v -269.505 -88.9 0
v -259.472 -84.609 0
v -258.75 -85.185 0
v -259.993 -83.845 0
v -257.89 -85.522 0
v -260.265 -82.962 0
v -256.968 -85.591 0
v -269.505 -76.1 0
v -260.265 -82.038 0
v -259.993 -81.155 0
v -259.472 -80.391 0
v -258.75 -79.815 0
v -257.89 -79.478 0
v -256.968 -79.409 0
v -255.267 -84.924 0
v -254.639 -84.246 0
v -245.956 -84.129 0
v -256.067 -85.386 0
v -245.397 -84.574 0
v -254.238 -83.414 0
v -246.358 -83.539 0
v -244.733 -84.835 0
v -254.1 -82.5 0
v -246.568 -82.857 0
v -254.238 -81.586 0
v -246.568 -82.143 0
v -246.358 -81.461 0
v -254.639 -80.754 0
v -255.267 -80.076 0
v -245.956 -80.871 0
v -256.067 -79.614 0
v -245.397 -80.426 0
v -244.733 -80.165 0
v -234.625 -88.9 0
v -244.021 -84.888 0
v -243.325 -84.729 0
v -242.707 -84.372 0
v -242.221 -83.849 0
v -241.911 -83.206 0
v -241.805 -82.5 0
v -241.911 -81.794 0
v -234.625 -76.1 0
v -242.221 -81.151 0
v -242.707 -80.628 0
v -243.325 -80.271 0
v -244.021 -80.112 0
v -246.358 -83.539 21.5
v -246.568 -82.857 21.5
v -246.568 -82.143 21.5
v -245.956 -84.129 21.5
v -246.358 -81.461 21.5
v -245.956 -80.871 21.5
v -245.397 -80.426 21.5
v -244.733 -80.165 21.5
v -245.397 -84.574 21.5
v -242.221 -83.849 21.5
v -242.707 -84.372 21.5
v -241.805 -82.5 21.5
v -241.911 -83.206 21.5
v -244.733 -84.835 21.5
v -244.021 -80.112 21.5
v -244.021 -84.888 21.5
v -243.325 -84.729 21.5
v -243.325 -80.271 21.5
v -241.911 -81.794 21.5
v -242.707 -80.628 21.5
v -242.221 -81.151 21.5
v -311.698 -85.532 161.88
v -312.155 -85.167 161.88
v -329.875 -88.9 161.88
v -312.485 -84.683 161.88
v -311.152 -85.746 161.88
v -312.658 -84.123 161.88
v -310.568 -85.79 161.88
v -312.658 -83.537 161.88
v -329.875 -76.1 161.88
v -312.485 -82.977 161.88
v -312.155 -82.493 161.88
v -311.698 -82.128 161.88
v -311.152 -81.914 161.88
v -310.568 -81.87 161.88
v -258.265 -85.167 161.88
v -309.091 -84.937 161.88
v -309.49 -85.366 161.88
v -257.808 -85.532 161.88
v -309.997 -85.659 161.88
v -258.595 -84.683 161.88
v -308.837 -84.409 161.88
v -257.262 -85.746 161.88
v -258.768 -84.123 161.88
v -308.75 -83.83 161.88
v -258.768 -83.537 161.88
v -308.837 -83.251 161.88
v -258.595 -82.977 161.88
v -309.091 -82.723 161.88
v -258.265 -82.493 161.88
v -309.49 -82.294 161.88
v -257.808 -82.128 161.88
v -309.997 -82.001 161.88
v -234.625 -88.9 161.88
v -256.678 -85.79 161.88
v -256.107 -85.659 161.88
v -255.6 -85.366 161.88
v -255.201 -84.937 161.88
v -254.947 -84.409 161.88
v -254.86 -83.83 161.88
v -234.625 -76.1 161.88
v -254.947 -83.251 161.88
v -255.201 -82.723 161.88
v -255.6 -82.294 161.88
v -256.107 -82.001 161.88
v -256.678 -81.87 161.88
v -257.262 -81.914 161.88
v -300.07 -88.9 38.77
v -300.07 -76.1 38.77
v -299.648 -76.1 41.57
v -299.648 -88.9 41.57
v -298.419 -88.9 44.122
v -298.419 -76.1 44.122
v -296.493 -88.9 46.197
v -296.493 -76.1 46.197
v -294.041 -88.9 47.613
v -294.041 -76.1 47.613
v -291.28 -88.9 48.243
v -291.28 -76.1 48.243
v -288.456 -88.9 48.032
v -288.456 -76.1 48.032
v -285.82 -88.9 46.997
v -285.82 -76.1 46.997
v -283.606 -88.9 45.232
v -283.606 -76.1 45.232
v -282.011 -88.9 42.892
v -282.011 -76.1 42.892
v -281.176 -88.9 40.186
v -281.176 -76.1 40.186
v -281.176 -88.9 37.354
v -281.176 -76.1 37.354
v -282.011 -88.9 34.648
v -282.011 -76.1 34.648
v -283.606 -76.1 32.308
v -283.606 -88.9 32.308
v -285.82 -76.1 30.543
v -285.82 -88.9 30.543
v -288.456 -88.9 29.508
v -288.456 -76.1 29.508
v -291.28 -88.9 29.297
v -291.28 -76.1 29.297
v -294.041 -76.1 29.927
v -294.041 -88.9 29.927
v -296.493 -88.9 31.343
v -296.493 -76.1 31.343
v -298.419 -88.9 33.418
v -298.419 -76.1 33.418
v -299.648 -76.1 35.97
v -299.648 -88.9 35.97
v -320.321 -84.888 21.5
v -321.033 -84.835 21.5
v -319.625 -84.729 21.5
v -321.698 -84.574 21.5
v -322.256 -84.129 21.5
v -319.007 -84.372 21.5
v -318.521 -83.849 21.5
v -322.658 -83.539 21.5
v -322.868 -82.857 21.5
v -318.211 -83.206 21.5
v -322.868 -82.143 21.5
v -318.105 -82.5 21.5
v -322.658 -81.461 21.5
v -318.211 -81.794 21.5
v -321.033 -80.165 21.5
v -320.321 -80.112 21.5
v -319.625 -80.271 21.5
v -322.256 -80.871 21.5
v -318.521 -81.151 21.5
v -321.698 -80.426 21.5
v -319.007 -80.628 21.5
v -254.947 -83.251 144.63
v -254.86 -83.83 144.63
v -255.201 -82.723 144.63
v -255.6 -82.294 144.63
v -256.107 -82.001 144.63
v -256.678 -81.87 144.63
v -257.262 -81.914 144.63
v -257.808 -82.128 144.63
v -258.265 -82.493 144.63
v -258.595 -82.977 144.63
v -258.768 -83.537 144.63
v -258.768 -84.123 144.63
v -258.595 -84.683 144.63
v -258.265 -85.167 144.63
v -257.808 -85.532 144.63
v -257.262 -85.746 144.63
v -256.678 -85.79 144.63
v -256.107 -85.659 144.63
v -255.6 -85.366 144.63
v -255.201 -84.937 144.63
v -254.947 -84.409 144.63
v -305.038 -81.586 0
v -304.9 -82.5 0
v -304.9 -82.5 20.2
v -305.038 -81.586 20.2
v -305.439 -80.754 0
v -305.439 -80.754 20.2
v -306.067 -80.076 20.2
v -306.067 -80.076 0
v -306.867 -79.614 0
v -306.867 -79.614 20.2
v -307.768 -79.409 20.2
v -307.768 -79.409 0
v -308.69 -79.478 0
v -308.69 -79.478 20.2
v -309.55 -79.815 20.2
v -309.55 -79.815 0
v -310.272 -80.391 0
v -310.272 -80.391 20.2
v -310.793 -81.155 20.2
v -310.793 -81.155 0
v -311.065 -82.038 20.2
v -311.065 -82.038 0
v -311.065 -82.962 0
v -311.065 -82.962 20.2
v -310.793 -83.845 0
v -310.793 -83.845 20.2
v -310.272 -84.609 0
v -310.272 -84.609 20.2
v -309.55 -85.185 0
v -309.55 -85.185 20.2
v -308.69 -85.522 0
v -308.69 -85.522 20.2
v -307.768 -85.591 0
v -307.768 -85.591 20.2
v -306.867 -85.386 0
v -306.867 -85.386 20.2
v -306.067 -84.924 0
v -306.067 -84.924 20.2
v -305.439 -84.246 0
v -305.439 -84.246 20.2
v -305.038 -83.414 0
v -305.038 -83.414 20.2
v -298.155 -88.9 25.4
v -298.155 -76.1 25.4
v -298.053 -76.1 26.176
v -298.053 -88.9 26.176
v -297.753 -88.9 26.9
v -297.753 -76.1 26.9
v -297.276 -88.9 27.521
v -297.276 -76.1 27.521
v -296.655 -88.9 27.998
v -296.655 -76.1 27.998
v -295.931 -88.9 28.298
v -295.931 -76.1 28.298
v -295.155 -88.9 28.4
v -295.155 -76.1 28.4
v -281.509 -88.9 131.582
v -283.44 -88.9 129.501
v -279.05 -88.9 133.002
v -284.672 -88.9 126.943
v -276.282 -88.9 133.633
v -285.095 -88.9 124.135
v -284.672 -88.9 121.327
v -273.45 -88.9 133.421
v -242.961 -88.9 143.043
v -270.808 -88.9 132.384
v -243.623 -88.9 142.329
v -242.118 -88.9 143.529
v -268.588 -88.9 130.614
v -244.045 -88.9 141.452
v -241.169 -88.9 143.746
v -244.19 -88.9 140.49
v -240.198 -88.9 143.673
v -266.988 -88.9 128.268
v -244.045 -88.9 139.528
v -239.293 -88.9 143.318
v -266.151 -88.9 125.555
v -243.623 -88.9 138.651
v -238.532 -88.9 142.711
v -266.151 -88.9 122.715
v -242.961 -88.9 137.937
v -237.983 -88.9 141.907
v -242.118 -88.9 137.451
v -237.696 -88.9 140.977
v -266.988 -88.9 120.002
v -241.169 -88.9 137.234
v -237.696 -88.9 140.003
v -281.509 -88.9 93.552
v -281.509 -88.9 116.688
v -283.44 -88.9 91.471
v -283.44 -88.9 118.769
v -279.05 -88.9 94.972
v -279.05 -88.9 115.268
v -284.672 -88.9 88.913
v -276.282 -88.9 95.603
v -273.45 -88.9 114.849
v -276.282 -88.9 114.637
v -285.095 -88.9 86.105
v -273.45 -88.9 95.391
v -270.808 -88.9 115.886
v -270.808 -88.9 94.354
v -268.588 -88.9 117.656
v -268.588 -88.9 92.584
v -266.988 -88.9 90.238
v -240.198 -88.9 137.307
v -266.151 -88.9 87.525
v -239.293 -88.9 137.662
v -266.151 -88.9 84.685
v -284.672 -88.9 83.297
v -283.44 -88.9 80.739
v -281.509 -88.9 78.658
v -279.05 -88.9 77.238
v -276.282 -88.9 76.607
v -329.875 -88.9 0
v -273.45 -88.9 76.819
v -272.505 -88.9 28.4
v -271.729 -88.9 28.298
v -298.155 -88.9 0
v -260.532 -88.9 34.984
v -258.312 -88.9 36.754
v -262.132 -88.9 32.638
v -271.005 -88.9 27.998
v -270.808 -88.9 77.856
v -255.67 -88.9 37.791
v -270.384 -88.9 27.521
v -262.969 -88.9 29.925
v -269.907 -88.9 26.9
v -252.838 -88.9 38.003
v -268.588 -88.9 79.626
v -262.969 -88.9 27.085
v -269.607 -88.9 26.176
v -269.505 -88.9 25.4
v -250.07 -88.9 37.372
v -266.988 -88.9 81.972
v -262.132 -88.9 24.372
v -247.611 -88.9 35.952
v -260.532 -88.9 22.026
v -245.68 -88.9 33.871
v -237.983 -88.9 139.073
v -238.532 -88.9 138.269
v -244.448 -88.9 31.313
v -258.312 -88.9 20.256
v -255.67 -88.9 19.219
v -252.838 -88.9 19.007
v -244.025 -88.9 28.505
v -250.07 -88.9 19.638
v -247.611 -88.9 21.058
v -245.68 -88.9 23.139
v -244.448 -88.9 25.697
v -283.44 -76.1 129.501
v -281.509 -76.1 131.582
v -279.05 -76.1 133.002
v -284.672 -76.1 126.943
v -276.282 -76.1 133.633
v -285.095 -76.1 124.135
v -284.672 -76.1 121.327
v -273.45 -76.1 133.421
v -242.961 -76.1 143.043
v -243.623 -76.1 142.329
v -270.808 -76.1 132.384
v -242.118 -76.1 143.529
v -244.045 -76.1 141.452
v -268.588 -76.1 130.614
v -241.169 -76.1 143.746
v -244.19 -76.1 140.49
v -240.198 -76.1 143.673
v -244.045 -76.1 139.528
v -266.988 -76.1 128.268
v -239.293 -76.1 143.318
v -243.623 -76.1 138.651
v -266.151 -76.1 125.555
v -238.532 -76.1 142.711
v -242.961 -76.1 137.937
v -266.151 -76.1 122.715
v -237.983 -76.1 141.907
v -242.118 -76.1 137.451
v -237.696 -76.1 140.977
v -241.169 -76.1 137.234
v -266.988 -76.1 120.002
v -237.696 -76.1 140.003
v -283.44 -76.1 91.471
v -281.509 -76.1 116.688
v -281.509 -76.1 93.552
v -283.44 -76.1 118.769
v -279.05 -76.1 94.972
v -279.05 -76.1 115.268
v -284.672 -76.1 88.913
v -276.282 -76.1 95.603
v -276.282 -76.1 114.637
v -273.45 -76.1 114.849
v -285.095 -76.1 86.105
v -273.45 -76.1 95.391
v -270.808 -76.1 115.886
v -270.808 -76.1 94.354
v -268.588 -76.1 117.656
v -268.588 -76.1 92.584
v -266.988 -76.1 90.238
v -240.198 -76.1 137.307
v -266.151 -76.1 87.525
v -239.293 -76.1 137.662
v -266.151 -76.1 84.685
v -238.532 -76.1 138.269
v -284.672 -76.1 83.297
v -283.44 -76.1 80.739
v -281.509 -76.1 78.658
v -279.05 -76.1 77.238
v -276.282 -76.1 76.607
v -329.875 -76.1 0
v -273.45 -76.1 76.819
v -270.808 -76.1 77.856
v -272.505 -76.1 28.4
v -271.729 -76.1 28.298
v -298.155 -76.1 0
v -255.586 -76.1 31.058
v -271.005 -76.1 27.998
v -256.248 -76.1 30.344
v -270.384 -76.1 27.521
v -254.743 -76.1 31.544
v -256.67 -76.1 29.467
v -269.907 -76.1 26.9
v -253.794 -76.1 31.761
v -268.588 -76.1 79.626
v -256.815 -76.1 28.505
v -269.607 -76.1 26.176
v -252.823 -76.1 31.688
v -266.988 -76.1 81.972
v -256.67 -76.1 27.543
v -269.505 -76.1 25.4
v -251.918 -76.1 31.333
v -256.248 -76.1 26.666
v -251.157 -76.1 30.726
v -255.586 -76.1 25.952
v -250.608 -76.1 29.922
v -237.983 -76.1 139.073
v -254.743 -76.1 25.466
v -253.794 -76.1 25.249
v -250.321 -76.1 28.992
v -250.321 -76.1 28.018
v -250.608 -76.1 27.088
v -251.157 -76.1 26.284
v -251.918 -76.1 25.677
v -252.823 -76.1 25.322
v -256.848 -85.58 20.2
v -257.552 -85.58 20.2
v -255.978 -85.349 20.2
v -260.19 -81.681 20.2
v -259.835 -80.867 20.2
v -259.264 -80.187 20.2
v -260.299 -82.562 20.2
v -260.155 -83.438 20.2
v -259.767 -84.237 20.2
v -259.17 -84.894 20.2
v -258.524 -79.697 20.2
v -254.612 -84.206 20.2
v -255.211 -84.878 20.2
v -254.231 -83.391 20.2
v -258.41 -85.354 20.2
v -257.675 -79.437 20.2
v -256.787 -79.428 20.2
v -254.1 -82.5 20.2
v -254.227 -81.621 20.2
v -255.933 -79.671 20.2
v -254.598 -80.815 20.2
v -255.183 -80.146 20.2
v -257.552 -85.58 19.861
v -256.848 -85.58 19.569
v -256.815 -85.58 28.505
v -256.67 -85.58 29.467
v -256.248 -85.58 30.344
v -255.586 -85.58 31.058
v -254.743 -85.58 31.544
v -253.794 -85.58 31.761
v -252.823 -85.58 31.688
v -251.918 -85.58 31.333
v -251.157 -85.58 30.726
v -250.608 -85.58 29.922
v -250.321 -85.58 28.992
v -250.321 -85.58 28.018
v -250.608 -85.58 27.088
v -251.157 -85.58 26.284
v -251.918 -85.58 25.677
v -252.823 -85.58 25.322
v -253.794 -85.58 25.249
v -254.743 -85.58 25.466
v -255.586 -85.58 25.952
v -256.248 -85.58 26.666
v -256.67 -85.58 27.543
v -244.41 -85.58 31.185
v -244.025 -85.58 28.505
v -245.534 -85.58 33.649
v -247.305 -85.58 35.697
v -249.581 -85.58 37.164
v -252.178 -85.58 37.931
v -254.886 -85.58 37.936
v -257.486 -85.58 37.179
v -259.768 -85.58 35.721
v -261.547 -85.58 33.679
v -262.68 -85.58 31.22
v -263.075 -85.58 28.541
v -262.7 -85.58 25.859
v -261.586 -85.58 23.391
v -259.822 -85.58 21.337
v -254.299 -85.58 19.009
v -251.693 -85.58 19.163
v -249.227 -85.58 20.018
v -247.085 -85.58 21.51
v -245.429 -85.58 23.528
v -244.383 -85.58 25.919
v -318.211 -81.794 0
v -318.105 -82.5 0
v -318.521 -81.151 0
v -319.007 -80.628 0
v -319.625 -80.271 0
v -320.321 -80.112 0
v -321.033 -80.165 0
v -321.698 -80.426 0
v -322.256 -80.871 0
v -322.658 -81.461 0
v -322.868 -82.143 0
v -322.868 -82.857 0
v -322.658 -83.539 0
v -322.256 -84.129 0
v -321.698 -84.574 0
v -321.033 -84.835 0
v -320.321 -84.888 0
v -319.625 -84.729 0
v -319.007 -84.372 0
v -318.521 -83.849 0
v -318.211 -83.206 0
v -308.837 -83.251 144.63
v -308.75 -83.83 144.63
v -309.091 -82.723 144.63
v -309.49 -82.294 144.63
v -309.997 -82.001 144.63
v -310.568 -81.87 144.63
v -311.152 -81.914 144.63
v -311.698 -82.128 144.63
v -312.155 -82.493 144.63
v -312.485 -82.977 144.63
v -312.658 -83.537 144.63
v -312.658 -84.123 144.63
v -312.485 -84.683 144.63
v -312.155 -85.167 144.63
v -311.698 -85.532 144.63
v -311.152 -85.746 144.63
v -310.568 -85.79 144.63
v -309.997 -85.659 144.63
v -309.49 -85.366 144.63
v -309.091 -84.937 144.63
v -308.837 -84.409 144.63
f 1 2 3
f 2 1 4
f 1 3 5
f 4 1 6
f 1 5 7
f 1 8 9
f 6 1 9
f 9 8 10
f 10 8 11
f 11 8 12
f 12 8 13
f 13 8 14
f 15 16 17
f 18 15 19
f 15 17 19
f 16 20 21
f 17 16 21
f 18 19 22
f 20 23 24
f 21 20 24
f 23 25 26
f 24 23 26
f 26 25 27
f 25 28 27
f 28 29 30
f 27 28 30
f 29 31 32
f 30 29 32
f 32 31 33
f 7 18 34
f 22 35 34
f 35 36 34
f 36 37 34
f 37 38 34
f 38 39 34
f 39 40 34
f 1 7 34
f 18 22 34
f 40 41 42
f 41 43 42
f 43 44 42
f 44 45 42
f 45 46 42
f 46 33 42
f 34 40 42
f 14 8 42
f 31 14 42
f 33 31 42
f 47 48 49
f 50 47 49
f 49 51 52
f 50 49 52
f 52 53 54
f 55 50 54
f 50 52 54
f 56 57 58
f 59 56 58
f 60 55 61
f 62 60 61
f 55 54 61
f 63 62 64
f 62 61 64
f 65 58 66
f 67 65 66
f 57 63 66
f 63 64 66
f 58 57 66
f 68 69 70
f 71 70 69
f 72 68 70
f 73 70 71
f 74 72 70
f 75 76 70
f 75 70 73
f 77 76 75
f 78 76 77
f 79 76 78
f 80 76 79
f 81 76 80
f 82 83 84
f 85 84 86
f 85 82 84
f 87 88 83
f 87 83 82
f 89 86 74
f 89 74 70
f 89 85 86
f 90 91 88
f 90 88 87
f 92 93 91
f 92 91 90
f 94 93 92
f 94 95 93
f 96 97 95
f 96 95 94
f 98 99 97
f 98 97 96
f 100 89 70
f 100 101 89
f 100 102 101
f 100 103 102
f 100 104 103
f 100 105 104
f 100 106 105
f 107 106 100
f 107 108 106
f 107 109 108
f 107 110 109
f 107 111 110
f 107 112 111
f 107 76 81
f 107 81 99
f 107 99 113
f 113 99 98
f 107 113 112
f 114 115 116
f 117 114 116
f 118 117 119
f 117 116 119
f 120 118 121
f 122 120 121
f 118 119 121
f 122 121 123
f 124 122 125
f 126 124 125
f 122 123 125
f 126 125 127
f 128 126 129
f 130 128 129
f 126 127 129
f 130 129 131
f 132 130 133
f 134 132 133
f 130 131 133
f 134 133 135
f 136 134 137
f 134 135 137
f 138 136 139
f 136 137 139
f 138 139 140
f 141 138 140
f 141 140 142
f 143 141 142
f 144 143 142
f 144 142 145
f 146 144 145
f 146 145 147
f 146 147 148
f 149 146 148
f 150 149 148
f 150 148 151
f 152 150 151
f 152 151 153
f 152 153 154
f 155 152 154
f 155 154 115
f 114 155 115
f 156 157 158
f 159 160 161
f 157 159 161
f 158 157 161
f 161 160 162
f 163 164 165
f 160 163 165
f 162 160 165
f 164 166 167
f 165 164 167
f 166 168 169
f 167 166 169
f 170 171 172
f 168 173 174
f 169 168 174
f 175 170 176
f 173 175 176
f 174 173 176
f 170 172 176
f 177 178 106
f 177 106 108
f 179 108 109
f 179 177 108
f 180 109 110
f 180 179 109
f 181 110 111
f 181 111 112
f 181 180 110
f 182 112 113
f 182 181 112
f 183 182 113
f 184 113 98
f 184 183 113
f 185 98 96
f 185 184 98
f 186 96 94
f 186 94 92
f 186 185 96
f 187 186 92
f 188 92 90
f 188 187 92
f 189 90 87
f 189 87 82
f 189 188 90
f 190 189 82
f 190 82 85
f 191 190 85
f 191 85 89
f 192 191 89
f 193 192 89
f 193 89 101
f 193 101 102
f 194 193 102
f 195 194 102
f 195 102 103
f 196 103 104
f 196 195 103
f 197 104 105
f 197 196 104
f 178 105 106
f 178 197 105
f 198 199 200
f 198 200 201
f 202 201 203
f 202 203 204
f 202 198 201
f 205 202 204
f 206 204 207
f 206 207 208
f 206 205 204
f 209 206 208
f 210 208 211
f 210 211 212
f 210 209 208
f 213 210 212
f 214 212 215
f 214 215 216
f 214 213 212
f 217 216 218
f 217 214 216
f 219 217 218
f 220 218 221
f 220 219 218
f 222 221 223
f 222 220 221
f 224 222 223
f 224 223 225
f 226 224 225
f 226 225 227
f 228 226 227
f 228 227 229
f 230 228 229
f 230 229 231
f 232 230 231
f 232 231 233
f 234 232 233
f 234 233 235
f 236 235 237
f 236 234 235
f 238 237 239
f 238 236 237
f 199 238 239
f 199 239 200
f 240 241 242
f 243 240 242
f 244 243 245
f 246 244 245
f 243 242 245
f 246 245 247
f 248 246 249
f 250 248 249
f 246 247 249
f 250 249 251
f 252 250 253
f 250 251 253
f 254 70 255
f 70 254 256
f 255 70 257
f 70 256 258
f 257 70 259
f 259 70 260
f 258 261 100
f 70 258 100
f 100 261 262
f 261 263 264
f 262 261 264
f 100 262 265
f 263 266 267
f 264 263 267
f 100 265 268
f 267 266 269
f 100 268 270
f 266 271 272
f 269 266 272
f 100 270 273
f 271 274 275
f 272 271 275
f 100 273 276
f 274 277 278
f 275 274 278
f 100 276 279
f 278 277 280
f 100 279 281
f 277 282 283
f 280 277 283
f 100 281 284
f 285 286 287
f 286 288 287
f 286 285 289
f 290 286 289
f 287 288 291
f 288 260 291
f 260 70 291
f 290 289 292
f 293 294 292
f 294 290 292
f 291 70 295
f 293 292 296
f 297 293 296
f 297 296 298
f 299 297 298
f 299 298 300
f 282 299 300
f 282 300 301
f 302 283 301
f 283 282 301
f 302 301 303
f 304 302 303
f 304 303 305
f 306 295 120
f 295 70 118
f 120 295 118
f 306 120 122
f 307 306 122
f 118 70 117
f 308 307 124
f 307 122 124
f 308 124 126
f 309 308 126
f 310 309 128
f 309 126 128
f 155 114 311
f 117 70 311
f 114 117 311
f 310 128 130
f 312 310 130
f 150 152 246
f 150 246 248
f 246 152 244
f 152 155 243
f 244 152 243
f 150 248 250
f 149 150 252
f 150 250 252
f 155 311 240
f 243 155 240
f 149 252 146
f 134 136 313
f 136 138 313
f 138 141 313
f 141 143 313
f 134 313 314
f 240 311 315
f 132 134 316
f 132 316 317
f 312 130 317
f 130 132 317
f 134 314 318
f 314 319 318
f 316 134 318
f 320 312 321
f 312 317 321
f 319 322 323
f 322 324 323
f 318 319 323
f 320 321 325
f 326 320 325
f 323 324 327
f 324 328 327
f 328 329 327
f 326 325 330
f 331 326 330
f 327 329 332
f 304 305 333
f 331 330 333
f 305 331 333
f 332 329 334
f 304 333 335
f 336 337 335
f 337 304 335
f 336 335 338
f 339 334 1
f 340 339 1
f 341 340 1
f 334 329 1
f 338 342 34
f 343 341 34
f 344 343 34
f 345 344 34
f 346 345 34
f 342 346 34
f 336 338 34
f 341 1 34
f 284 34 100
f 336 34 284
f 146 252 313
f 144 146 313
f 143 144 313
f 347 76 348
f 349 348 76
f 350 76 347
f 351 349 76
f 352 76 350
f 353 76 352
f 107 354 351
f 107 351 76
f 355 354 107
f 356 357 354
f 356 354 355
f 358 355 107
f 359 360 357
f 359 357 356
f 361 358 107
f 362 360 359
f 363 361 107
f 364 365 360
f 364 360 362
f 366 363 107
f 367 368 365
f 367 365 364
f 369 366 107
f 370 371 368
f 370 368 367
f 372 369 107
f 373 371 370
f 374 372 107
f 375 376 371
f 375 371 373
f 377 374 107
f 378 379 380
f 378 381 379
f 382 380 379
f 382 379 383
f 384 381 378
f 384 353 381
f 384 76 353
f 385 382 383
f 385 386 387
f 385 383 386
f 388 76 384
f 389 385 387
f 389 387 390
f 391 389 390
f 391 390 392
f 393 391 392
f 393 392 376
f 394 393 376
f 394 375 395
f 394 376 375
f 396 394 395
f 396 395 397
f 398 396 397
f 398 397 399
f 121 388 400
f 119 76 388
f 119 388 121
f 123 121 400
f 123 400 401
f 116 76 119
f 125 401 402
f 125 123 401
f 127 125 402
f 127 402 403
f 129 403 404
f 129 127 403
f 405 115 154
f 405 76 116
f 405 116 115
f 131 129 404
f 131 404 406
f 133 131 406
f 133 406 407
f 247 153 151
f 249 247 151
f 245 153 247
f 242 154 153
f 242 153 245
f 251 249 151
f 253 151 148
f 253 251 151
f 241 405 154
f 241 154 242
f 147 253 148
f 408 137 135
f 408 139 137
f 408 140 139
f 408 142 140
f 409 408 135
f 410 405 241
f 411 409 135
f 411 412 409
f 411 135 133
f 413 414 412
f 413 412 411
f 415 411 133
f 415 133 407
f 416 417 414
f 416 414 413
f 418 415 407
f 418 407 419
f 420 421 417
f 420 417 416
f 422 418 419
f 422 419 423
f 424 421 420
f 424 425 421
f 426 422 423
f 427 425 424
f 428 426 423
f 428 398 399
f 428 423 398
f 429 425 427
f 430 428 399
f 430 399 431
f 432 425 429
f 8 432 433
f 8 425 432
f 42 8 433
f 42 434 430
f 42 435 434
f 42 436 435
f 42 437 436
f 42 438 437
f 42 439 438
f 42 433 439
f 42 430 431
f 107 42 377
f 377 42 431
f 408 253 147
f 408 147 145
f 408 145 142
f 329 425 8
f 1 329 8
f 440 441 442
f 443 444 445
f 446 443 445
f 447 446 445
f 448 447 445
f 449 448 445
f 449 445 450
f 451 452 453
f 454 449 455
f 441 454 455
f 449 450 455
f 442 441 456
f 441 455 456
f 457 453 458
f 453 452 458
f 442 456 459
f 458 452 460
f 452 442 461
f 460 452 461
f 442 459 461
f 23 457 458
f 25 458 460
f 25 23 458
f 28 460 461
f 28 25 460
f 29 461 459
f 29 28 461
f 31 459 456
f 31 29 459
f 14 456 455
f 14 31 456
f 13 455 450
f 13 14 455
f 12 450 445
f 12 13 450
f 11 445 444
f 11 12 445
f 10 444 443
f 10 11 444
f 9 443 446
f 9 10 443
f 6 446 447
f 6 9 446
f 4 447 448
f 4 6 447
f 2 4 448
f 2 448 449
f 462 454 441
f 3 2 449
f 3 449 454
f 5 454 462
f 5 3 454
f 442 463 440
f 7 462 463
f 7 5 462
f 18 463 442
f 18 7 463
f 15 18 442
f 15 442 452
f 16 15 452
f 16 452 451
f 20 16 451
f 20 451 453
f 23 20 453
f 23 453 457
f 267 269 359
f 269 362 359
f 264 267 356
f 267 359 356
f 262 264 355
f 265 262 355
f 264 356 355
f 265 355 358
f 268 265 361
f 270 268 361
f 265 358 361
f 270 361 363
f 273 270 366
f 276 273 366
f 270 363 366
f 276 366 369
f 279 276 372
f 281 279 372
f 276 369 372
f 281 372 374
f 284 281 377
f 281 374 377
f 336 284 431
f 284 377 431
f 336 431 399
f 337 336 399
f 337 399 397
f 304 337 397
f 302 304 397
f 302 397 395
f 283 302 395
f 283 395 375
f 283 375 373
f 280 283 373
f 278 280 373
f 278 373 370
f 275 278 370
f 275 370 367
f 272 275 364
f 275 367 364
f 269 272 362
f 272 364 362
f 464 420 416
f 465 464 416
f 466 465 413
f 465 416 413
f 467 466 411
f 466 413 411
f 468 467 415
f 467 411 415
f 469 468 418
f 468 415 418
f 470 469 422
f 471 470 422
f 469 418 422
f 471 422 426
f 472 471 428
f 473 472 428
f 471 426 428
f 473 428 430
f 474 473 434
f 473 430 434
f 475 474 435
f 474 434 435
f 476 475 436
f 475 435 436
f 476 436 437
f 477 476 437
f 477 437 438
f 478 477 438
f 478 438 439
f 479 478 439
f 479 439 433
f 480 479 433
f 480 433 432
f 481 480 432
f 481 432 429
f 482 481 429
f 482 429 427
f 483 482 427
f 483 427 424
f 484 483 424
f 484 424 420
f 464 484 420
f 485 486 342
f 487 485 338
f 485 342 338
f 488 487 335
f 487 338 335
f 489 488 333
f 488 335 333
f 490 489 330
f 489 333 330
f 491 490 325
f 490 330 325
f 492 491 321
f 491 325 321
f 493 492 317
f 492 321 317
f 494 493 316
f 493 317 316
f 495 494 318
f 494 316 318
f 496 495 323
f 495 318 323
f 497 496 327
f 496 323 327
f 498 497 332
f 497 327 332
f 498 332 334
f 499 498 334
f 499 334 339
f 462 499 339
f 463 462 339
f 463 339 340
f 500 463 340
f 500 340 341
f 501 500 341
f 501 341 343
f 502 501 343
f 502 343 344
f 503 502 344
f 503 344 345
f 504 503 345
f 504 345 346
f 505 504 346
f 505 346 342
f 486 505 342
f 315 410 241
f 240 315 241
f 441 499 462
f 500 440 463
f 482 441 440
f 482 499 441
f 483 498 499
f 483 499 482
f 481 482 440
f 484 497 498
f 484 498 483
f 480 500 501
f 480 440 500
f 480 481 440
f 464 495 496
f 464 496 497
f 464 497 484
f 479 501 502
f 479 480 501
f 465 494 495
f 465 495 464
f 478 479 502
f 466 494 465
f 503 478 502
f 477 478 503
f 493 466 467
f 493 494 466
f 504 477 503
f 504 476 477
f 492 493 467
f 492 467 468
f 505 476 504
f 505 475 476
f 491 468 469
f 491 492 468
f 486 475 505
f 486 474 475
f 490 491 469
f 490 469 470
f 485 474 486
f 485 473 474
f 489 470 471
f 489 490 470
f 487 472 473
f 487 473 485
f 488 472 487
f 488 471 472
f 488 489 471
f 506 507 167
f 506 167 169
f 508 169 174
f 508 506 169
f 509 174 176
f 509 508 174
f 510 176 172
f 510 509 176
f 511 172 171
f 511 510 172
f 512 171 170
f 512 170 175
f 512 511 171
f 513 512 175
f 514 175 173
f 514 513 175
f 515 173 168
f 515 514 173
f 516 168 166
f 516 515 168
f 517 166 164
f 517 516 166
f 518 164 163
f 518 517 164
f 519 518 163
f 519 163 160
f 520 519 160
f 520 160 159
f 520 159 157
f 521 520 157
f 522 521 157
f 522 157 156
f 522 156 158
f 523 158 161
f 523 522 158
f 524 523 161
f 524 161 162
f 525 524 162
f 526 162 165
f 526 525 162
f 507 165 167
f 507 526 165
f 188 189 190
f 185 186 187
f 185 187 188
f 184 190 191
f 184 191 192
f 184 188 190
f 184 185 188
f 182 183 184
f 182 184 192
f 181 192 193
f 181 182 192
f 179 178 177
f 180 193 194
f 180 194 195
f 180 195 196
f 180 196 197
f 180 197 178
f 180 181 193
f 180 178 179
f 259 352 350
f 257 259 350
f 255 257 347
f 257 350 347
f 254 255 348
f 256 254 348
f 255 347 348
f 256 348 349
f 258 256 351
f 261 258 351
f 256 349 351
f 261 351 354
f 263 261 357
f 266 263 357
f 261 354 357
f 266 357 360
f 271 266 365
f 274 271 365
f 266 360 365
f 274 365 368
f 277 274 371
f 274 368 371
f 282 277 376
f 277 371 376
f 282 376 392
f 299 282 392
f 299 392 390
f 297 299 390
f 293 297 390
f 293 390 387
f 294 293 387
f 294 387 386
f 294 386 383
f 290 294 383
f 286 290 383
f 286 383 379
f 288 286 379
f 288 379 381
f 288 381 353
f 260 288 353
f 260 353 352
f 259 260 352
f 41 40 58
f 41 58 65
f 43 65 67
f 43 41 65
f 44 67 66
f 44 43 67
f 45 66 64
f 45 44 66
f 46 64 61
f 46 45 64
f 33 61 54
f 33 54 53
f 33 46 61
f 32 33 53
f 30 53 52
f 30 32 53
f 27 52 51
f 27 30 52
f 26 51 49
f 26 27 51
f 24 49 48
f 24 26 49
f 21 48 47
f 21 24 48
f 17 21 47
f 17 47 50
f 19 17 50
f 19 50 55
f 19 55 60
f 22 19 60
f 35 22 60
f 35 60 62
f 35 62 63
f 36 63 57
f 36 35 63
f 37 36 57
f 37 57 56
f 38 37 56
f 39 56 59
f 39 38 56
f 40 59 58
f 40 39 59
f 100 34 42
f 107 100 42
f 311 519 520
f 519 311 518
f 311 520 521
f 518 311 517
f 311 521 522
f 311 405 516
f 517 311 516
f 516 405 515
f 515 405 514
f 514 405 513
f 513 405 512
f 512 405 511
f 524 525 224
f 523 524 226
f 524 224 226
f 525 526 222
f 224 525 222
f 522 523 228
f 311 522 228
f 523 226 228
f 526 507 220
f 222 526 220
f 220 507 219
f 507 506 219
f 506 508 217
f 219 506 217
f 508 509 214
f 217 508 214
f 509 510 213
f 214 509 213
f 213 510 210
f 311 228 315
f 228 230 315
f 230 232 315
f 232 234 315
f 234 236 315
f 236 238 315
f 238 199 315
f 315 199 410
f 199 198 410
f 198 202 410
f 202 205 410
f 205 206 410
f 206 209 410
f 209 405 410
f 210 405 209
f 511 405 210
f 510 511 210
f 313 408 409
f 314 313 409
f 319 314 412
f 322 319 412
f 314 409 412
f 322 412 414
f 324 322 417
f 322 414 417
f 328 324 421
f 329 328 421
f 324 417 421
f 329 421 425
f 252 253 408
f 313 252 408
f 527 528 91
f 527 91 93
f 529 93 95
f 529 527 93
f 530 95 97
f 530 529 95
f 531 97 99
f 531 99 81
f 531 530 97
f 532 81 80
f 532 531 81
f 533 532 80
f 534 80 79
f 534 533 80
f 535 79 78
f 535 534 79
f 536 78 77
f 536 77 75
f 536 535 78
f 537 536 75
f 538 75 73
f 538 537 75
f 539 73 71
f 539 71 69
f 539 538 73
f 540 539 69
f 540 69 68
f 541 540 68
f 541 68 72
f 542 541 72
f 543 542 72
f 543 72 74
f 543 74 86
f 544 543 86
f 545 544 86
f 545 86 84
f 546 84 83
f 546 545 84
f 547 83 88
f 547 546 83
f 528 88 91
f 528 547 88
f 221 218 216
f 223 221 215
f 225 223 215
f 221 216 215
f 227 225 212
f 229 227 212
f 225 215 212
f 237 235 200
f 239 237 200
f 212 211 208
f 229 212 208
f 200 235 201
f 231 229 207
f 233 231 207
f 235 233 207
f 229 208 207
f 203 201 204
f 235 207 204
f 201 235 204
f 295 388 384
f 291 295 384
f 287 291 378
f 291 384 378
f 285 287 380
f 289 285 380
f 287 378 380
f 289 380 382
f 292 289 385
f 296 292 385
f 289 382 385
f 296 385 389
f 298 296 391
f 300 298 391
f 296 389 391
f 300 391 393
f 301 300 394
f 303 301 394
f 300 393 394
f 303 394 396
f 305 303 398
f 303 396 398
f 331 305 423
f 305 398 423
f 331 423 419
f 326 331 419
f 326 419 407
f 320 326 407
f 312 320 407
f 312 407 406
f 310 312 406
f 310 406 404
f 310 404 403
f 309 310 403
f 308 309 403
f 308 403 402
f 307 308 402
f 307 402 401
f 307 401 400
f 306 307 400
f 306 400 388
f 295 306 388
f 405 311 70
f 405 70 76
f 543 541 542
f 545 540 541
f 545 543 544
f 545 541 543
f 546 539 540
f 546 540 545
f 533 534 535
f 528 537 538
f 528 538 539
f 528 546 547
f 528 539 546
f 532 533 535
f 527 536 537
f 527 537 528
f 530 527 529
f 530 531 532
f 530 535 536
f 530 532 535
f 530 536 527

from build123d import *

# Parameters (mm, degrees)
SKETCH1_W           = 95.25
SKETCH1_H           = 12.8
BOSS_EXTRUDE1_DEPTH = 161.88
SKETCH1_3_R         = 3.1
CUT_EXTRUDE1_DEPTH  = 20.2
SKETCH1_4_R         = 2.395
CUT_EXTRUDE2_DEPTH  = 21.5
CUT_EXTRUDE3_REACH  = 14.8
SKETCH2_R           = 9.525
SKETCH2_R_2         = 3.265
SKETCH3_R           = 3.265
SKETCH3_R_2         = 9.525
CUT_EXTRUDE4_DEPTH  = 3.32
CUT_EXTRUDE5_START  = -17.25
SKETCH4_R           = 1.965
CUT_EXTRUDE5_DEPTH  = 17.25
SKETCH6_R           = 9.5
CUT_EXTRUDE6_DEPTH  = 13.8000001


with BuildPart() as part:
    # Sketch1 → Boss-Extrude1 (new body)
    with BuildSketch(Plane.XY):
        with Locations((-282.25, -82.5)):
            Rectangle(SKETCH1_W, SKETCH1_H)
    extrude(amount=BOSS_EXTRUDE1_DEPTH)

    # Sketch1<3> → Cut-Extrude1 (cut)
    with BuildSketch(Plane.XY):
        with Locations((-308, -82.5)):
            Circle(SKETCH1_3_R)
        with Locations((-257.2, -82.5)):
            Circle(SKETCH1_3_R)
    extrude(amount=CUT_EXTRUDE1_DEPTH, mode=Mode.SUBTRACT)

    # Sketch1<4> → Cut-Extrude2 (cut)
    with BuildSketch(Plane.XY):
        with Locations((-320.5, -82.5)):
            Circle(SKETCH1_4_R)
        with Locations((-244.2, -82.5)):
            Circle(SKETCH1_4_R)
    extrude(amount=CUT_EXTRUDE2_DEPTH, mode=Mode.SUBTRACT)

    # Sketch2 → Cut-Extrude3 (cut, up to next)
    with BuildSketch(Plane(origin=(0, -76.1, 0), x_dir=(-1, 0, 0), z_dir=(0, 1, 0)), mode=Mode.PRIVATE) as cut_extrude3_sk1:
        with Locations((275.57, 86.105)):
            Circle(SKETCH2_R)
    cut_extrude3_tool1 = extrude(cut_extrude3_sk1.sketch, amount=-CUT_EXTRUDE3_REACH, mode=Mode.PRIVATE) & part.part
    add(cut_extrude3_tool1.solids().sort_by_distance((-275.57, -76.1, 86.105))[0], mode=Mode.SUBTRACT)
    # Sketch2 → Cut-Extrude3 (cut, up to next)
    with BuildSketch(Plane(origin=(0, -76.1, 0), x_dir=(-1, 0, 0), z_dir=(0, 1, 0)), mode=Mode.PRIVATE) as cut_extrude3_sk2:
        with Locations((275.57, 124.135)):
            Circle(SKETCH2_R)
    cut_extrude3_tool2 = extrude(cut_extrude3_sk2.sketch, amount=-CUT_EXTRUDE3_REACH, mode=Mode.PRIVATE) & part.part
    add(cut_extrude3_tool2.solids().sort_by_distance((-275.57, -76.1, 124.135))[0], mode=Mode.SUBTRACT)
    # Sketch2 → Cut-Extrude3 (cut, up to next)
    with BuildSketch(Plane(origin=(0, -76.1, 0), x_dir=(-1, 0, 0), z_dir=(0, 1, 0)), mode=Mode.PRIVATE) as cut_extrude3_sk3:
        with Locations((253.55, 28.505)):
            Circle(SKETCH2_R_2)
    cut_extrude3_tool3 = extrude(cut_extrude3_sk3.sketch, amount=-CUT_EXTRUDE3_REACH, mode=Mode.PRIVATE) & part.part
    add(cut_extrude3_tool3.solids().sort_by_distance((-253.55, -76.1, 28.505))[0], mode=Mode.SUBTRACT)
    # Sketch2 → Cut-Extrude3 (cut, up to next)
    with BuildSketch(Plane(origin=(0, -76.1, 0), x_dir=(-1, 0, 0), z_dir=(0, 1, 0)), mode=Mode.PRIVATE) as cut_extrude3_sk4:
        with Locations((240.925, 140.49)):
            Circle(SKETCH2_R_2)
    cut_extrude3_tool4 = extrude(cut_extrude3_sk4.sketch, amount=-CUT_EXTRUDE3_REACH, mode=Mode.PRIVATE) & part.part
    add(cut_extrude3_tool4.solids().sort_by_distance((-240.925, -76.1, 140.49))[0], mode=Mode.SUBTRACT)
    # Sketch2 → Cut-Extrude3 (cut, up to next)
    with BuildSketch(Plane(origin=(0, -76.1, 0), x_dir=(-1, 0, 0), z_dir=(0, 1, 0)), mode=Mode.PRIVATE) as cut_extrude3_sk5:
        with BuildLine():
            Line((269.505, 25.4), (269.505, 0))
            Line((269.505, 0), (298.155, 0))
            Line((298.155, 0), (298.155, 25.4))
            ThreePointArc((298.155, 25.4), (297.276320344, 27.521320344), (295.155, 28.4))
            Line((295.155, 28.4), (272.505, 28.4))
            ThreePointArc((272.505, 28.4), (270.383679656, 27.521320344), (269.505, 25.4))
        make_face()
    cut_extrude3_tool5 = extrude(cut_extrude3_sk5.sketch, amount=-CUT_EXTRUDE3_REACH, mode=Mode.PRIVATE) & part.part
    add(cut_extrude3_tool5.solids().sort_by_distance((-283.83, -76.1, 14.135461))[0], mode=Mode.SUBTRACT)

    # Sketch3 → Cut-Extrude4 (cut)
    with BuildSketch(Plane.XZ.offset(88.9)):
        with Locations((-240.925, 140.49)):
            Circle(SKETCH3_R)
        with Locations((-253.55, 28.505)):
            Circle(SKETCH3_R_2)
    extrude(amount=-CUT_EXTRUDE4_DEPTH, mode=Mode.SUBTRACT)

    # Sketch4 → Cut-Extrude5 (cut)
    with BuildSketch(Plane.XY.offset(161.88).offset(CUT_EXTRUDE5_START)):
        with Locations((-256.825, -83.83)):
            Circle(SKETCH4_R)
        with Locations((-310.715, -83.83)):
            Circle(SKETCH4_R)
    extrude(amount=CUT_EXTRUDE5_DEPTH, mode=Mode.SUBTRACT)

    # Sketch6 → Cut-Extrude6 (cut, through all)
    with BuildSketch(Plane(origin=(0, -76.1, 0), x_dir=(-1, 0, 0), z_dir=(0, 1, 0))):
        with Locations((290.57, 38.77)):
            Circle(SKETCH6_R)
    extrude(amount=-CUT_EXTRUDE6_DEPTH, mode=Mode.SUBTRACT)


solid = part.part
